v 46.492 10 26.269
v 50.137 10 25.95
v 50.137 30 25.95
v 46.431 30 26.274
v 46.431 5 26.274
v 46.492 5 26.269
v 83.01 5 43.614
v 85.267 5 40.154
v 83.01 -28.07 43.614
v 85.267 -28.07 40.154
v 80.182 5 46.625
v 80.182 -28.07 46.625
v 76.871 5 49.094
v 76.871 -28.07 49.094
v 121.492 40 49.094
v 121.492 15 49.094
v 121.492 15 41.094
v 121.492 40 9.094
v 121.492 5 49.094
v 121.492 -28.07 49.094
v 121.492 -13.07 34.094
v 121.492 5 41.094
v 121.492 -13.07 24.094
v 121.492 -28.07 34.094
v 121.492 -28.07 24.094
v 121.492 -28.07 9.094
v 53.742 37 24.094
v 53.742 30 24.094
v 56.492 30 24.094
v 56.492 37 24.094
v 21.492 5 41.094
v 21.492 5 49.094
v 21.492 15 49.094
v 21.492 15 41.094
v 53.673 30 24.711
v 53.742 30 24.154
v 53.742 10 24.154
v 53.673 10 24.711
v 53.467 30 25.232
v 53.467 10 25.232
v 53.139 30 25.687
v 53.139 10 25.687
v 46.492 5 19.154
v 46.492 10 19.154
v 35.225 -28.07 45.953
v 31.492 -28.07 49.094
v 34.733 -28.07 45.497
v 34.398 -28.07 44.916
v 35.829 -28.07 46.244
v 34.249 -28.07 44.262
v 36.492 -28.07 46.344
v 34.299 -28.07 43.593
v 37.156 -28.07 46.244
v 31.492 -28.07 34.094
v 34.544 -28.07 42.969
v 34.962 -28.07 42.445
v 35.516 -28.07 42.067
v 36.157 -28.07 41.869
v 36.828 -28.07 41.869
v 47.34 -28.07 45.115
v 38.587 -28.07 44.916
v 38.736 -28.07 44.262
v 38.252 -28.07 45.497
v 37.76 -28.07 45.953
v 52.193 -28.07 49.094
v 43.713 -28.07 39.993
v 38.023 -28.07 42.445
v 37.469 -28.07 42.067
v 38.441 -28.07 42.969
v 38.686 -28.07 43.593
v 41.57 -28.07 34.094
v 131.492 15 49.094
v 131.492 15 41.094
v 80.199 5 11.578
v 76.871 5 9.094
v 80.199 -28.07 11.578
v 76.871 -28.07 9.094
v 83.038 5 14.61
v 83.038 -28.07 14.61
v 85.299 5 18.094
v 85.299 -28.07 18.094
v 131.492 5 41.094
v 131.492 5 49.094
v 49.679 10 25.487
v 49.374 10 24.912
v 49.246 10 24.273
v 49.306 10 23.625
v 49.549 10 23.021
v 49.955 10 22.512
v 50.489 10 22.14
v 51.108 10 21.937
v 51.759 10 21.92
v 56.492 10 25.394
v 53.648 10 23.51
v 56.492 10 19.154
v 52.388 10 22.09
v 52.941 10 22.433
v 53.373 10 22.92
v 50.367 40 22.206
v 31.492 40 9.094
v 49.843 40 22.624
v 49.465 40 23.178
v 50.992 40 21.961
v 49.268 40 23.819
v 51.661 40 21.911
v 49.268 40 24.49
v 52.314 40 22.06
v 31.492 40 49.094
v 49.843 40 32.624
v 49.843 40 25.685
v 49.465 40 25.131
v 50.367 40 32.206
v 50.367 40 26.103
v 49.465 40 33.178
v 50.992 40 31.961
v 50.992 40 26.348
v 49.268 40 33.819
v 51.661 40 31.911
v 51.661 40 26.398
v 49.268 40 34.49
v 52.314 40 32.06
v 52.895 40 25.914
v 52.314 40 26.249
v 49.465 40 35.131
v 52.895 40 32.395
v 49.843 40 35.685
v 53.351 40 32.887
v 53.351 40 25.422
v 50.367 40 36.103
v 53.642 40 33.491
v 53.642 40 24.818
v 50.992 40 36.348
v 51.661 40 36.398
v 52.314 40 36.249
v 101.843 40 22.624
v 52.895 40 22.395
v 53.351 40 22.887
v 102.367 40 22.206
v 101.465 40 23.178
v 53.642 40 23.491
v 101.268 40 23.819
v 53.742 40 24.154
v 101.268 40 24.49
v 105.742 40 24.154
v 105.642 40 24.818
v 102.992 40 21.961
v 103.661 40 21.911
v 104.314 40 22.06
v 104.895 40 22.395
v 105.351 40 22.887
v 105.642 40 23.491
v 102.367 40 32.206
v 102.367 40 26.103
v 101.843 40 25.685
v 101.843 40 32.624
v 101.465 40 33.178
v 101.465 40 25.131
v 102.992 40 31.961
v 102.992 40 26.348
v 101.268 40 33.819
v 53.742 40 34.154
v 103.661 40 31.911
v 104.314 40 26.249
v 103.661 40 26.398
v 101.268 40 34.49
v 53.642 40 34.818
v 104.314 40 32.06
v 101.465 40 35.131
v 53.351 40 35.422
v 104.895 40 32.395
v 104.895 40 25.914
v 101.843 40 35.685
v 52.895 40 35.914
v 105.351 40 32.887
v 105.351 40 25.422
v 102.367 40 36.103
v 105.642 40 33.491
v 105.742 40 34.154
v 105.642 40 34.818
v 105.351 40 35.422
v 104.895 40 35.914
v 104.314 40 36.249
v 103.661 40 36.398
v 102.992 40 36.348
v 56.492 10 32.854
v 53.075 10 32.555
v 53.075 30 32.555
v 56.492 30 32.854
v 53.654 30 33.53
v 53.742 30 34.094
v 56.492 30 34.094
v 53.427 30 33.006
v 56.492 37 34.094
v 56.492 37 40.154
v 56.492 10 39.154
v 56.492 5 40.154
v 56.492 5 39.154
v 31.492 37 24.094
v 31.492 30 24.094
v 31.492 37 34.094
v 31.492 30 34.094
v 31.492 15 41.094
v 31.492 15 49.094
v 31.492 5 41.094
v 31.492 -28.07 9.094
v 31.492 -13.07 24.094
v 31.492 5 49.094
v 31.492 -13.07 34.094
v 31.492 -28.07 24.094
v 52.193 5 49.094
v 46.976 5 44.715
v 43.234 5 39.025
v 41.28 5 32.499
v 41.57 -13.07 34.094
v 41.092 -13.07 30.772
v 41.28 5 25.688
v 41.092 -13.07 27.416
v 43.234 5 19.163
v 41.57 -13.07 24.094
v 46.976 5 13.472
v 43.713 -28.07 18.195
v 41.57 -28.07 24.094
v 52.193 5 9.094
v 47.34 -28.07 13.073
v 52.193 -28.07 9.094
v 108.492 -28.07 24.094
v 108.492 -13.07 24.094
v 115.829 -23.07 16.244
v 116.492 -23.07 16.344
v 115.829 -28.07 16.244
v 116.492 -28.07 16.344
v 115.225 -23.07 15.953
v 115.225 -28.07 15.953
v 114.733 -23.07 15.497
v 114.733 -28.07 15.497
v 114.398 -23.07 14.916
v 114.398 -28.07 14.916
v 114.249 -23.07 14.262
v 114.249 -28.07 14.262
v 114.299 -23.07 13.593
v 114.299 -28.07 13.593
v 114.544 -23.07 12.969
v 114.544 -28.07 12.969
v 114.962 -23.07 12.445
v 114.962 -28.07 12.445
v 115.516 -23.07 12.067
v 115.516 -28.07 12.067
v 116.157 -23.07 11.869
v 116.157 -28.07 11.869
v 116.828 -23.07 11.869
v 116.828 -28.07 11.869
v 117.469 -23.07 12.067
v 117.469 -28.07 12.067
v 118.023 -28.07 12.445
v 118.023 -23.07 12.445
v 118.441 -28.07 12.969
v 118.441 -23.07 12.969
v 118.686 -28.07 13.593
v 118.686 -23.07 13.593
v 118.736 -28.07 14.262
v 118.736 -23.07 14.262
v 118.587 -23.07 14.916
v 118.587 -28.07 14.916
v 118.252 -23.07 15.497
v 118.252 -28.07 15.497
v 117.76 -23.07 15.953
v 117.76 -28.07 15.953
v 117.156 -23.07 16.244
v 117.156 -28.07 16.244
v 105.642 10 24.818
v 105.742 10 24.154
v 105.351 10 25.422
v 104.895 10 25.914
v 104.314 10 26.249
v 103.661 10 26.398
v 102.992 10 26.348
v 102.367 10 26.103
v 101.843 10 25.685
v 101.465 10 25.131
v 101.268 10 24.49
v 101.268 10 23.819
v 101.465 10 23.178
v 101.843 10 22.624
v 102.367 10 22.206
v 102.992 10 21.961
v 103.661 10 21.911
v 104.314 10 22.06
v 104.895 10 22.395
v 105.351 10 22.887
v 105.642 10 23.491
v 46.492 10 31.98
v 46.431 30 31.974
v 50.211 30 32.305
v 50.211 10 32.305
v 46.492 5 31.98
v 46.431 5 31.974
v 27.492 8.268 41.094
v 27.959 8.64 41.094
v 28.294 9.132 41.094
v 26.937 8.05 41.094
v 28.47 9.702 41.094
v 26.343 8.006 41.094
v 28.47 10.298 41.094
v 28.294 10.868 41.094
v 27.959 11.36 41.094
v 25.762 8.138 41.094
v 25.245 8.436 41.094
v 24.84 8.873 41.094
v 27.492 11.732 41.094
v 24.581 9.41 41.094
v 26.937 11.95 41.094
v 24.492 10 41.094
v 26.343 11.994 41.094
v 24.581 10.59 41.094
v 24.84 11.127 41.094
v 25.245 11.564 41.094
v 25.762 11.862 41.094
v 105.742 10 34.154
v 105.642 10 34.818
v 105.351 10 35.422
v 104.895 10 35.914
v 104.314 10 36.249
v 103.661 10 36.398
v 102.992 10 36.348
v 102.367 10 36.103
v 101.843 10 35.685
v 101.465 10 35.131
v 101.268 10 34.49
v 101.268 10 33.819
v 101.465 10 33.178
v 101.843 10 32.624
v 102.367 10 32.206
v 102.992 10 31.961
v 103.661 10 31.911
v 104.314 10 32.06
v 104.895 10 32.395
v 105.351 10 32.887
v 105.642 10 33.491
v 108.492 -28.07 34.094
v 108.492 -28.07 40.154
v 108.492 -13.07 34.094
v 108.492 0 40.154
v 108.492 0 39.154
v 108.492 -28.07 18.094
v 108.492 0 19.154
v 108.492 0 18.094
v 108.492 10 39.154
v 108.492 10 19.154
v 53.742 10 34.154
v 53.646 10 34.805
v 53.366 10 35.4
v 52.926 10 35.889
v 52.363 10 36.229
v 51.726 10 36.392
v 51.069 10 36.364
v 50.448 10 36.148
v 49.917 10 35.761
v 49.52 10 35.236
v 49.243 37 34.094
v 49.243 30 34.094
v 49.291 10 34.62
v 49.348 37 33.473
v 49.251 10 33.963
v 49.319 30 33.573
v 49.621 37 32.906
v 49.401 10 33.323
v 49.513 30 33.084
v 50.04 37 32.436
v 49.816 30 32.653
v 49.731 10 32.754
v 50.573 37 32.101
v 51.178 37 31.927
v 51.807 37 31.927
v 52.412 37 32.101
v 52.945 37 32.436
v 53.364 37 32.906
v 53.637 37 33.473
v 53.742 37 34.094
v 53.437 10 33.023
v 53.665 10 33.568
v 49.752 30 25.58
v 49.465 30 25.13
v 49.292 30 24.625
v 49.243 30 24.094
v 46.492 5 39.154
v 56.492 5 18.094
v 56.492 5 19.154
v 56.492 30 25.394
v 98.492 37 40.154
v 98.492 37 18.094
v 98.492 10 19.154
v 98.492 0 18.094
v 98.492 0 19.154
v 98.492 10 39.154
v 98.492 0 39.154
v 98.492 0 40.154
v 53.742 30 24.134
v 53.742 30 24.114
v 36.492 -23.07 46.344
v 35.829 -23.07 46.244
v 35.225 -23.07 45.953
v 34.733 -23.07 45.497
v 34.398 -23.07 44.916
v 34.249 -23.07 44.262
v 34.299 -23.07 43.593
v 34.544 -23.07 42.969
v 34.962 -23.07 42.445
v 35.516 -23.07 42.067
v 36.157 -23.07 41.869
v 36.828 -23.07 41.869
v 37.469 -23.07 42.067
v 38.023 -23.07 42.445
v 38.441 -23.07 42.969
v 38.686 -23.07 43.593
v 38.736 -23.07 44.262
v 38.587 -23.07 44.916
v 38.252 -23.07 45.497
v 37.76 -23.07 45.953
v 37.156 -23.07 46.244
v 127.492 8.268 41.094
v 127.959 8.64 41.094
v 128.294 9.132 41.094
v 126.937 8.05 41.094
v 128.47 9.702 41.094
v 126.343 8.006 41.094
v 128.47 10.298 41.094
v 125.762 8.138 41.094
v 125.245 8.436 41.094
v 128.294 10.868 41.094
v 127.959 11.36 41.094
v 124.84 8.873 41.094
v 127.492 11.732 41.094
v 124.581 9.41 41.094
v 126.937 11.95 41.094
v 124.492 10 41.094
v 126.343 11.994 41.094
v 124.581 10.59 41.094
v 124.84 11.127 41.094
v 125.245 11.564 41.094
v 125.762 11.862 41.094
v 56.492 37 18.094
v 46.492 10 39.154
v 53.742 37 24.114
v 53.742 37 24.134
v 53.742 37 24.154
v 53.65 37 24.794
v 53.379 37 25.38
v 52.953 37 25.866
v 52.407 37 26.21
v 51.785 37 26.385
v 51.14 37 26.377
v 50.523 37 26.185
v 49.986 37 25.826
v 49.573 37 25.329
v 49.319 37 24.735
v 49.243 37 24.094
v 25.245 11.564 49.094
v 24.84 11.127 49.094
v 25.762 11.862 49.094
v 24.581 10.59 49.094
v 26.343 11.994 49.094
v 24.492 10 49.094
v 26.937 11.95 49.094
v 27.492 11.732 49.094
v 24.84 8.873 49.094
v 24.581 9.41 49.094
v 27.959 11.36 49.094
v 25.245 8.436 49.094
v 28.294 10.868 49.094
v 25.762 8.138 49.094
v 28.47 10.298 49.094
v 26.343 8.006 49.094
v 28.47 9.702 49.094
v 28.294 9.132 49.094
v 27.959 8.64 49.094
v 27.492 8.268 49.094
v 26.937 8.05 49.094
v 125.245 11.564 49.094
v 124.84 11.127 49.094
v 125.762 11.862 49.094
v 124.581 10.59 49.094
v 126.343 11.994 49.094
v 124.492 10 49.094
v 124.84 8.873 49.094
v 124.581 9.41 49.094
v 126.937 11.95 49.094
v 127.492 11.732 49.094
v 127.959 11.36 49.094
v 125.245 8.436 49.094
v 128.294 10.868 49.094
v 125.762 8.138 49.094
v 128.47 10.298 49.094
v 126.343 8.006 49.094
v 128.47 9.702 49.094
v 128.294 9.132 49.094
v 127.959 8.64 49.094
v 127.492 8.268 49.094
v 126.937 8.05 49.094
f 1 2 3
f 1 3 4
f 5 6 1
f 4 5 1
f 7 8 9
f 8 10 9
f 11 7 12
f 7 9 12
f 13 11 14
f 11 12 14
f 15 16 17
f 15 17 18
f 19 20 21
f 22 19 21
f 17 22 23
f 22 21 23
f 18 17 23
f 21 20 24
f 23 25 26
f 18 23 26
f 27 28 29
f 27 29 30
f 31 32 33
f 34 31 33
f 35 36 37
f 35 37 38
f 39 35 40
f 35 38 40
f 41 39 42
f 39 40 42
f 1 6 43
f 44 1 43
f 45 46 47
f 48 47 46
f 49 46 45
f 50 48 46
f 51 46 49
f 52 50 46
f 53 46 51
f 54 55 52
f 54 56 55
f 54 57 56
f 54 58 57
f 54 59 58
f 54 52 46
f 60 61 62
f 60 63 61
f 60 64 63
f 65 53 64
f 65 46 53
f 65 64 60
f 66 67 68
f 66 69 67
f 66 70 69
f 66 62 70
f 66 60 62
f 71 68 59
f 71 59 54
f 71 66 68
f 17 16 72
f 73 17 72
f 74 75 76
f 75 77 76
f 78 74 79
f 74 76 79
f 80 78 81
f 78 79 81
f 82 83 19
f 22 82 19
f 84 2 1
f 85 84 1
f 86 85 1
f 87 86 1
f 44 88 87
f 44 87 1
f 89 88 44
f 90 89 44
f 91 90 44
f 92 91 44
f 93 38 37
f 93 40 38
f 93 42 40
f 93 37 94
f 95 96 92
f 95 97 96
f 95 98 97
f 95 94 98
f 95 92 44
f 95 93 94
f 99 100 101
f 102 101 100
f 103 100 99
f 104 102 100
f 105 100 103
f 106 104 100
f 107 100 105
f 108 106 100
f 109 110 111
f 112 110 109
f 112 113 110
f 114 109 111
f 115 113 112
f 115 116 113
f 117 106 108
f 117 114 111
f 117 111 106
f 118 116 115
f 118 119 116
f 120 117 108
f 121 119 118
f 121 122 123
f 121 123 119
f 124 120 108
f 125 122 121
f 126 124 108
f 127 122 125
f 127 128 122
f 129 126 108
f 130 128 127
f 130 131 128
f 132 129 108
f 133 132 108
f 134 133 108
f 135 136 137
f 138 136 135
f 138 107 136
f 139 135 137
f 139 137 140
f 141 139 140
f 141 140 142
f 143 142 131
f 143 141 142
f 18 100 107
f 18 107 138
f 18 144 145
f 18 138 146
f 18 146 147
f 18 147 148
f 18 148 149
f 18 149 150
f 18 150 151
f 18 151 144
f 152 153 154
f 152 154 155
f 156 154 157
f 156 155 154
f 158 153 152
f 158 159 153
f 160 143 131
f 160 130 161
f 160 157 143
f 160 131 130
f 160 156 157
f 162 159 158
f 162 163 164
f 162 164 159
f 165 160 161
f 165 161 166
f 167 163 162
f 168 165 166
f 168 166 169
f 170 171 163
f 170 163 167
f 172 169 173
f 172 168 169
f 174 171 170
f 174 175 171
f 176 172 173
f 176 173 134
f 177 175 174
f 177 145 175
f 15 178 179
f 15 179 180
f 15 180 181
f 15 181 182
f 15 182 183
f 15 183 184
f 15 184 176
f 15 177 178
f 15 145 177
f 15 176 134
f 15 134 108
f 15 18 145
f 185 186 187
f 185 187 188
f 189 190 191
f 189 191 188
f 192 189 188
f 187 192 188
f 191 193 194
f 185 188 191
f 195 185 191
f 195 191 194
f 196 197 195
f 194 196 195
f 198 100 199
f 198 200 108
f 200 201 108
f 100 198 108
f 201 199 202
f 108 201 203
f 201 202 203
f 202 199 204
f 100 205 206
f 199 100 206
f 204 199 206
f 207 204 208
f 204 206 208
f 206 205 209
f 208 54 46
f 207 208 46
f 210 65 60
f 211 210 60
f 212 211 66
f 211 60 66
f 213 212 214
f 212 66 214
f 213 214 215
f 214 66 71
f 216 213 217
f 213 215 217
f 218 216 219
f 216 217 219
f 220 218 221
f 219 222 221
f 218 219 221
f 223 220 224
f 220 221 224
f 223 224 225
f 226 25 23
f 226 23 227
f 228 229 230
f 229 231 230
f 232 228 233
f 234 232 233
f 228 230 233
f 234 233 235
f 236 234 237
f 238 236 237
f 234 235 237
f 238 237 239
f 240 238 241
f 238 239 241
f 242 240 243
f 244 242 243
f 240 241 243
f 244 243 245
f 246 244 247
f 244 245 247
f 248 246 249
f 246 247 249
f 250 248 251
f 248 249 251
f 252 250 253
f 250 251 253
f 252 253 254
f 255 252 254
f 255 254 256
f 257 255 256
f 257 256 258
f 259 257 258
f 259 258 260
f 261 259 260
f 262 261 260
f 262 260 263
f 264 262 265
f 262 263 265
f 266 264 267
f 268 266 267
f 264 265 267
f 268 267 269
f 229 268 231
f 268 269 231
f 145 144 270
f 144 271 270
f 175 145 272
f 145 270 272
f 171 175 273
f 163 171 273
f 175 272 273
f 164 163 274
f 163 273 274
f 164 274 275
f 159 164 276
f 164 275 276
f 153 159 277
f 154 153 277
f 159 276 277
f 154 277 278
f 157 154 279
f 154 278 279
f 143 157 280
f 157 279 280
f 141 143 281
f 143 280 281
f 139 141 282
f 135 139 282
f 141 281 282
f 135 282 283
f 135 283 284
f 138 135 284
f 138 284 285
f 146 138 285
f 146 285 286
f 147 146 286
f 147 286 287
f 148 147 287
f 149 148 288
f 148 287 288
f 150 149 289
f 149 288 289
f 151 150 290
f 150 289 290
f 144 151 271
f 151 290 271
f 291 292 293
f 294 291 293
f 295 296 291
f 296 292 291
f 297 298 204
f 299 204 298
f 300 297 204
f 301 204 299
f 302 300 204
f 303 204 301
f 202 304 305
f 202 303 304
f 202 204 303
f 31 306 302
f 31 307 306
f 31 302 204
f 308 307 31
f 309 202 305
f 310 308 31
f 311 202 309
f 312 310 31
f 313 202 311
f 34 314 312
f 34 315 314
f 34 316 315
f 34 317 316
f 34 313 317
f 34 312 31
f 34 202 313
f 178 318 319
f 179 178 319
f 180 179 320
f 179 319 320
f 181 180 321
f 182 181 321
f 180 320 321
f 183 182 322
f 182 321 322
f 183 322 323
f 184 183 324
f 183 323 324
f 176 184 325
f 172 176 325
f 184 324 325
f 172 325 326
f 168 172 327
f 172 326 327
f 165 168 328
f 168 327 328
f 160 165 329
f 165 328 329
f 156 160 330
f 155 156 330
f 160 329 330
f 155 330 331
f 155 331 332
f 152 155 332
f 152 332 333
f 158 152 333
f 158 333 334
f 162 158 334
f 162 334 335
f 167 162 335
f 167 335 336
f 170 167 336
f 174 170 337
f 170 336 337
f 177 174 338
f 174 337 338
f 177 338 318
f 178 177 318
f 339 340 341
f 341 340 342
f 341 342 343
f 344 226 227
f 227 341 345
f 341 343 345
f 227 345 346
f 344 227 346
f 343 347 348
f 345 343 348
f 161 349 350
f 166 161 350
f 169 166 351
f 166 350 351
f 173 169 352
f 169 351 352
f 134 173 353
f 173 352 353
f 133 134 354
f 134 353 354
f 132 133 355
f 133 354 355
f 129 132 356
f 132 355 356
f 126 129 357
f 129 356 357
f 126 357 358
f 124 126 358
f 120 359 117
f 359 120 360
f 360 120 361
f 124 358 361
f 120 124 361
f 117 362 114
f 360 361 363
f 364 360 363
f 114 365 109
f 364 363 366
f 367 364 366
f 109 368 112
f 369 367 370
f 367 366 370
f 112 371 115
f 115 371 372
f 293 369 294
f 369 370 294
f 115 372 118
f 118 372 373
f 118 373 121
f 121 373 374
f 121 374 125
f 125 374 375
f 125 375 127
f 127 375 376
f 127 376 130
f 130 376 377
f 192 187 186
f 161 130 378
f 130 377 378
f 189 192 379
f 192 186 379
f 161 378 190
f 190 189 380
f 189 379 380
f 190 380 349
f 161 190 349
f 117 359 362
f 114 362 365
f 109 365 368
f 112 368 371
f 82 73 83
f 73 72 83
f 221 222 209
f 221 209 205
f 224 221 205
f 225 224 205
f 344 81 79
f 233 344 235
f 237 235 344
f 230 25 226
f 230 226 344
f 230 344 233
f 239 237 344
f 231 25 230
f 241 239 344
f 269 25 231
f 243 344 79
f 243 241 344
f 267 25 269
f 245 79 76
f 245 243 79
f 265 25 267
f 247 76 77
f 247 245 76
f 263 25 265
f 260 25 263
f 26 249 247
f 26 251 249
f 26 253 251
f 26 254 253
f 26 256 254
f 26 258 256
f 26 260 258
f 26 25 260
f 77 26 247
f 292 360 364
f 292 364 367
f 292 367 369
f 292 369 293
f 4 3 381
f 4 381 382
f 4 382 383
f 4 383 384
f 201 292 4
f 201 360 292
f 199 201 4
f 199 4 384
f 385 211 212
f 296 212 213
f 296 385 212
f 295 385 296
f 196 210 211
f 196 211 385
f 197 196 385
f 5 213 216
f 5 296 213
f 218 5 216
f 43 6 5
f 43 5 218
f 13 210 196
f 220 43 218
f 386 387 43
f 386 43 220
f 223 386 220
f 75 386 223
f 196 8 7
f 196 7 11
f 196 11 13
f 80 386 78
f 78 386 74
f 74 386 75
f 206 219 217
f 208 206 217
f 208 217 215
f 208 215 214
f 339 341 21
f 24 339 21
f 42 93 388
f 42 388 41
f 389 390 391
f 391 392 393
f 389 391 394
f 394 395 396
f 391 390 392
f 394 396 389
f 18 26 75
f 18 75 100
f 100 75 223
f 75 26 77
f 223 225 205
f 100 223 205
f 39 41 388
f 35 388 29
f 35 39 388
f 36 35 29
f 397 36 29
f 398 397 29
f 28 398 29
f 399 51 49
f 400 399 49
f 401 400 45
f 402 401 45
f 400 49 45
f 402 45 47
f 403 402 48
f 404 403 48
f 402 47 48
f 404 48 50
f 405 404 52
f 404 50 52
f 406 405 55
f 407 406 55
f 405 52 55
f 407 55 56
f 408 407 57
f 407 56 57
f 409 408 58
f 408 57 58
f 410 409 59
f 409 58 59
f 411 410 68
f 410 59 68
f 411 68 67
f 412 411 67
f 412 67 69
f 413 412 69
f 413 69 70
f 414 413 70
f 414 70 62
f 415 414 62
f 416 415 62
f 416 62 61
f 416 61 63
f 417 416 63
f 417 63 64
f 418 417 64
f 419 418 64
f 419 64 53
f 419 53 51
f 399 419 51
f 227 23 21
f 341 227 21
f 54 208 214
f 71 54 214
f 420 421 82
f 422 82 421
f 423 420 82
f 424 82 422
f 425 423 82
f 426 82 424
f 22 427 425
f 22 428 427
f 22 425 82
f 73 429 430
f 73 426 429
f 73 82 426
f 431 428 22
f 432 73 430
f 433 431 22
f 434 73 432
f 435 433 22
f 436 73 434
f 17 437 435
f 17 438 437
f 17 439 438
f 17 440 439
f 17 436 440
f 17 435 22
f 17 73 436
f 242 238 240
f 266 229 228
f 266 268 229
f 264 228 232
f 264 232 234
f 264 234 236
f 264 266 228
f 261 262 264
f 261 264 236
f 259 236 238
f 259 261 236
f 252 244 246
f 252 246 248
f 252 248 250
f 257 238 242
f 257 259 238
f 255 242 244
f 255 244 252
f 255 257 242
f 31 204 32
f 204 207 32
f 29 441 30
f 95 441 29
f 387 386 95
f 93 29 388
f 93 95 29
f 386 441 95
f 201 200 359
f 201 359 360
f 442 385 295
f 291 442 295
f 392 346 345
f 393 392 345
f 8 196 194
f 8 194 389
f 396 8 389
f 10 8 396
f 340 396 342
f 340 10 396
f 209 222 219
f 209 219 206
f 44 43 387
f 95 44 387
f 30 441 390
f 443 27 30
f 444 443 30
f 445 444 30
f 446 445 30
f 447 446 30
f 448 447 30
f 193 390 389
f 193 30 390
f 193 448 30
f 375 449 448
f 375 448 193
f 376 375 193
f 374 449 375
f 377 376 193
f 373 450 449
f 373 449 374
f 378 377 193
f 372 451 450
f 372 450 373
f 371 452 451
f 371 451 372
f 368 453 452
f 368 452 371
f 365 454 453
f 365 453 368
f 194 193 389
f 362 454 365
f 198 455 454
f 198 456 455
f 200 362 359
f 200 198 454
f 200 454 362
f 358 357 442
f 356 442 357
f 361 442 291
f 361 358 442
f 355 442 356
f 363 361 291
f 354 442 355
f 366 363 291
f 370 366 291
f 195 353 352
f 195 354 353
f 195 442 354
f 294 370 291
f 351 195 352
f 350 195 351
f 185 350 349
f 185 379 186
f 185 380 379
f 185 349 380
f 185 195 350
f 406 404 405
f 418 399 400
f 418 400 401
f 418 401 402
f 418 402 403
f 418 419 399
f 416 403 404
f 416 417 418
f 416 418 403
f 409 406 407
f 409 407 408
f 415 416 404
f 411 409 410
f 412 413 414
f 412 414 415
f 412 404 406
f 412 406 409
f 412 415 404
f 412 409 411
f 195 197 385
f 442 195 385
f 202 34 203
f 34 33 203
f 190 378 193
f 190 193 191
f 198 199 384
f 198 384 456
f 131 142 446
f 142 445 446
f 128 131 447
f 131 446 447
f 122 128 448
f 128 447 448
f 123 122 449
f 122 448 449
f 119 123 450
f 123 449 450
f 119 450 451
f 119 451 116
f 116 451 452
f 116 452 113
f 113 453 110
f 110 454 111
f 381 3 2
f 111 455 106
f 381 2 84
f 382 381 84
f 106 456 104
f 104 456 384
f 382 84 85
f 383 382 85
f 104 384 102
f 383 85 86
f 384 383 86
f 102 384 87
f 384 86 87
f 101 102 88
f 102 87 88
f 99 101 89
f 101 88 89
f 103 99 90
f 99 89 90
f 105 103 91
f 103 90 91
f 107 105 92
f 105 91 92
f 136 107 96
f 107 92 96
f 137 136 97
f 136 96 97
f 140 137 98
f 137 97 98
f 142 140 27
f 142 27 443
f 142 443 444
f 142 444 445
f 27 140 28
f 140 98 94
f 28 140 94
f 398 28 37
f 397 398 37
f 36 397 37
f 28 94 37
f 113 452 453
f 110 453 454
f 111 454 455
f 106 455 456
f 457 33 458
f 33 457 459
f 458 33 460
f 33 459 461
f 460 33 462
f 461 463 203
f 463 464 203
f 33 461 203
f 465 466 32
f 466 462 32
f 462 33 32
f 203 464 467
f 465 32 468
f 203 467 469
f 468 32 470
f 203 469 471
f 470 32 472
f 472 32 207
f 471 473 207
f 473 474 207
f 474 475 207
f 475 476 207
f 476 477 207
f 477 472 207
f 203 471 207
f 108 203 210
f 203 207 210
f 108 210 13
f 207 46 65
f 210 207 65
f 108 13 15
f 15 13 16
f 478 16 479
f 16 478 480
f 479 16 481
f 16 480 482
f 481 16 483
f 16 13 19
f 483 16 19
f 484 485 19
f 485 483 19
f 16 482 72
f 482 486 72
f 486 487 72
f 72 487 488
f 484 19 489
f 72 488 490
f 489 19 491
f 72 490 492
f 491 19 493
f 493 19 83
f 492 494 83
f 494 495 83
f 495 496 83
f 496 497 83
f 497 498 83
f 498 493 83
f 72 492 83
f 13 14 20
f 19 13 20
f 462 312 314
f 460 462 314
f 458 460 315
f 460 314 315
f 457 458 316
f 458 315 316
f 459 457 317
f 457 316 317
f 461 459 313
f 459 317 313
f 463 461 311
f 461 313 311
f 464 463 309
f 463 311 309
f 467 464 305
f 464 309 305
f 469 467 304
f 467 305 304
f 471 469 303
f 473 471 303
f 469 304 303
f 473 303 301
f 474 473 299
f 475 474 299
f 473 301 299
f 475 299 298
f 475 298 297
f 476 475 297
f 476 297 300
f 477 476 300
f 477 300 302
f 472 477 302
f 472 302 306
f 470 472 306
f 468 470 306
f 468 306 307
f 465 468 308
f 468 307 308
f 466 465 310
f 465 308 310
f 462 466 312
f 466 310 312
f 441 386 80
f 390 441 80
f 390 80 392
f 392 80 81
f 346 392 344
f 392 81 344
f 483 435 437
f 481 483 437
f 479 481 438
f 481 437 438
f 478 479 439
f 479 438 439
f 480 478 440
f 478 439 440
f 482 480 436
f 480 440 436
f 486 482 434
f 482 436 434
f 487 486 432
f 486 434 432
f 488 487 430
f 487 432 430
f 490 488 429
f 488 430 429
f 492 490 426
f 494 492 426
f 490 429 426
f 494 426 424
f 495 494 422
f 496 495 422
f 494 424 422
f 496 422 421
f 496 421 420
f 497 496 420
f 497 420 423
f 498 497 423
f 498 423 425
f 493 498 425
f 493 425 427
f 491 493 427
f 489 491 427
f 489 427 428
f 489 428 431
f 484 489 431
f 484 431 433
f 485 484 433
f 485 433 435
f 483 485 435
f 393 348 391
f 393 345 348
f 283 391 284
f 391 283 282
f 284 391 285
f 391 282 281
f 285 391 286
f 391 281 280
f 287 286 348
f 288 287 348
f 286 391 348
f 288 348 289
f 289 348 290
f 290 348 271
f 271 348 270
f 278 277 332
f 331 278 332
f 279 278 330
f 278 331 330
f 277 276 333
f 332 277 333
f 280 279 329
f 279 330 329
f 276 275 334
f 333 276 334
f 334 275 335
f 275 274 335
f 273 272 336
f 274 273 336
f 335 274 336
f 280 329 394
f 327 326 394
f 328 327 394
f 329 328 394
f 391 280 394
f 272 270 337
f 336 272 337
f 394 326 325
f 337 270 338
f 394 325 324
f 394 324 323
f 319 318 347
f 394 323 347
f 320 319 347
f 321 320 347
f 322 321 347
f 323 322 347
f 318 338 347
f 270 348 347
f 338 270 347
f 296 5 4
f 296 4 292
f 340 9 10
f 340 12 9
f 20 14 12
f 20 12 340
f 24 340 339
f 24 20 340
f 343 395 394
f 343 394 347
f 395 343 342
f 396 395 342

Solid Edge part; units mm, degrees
sketch "Sketch1" plane through (0, 0, 0) normal (0, -1, 0) x (1, 0, 0)
  line L0 (31.4924, 49.0939) -> (121.4924, 49.0939)
  line L1 (121.4924, 49.0939) -> (121.4924, 9.0939)
  line L2 (121.4924, 9.0939) -> (31.4924, 9.0939)
  line L3 (31.4924, 9.0939) -> (31.4924, 49.0939)
  dimension "D1" = 90
  dimension "D2" = 40
extrude "Protrusion1" add sketch "Sketch1" against normal blind 40
sketch "Sketch2" plane through (64.4924, 0, 22.0939) normal (0, -1, 0) x (1, 0, 0)
  line L0 (-18.0616, 9.8803) -> (-8, 10.7605)
  line L1 (-8, 10.7605) -> (-8, 18.0605)
  line L2 (-8, 18.0605) -> (34, 18.0605)
  line L3 (34, -4) -> (34, 18.0605)
  line L4 (-8, -4) -> (34, -4)
  line L5 (-8, -4) -> (-8, 3.3)
  line L6 (-8, 3.3) -> (-18.0616, 4.1803)
  line L7 (-18.0616, 4.1803) -> (-18.0616, 9.8803)
extrude "ExtrudedCutout_4" cut sketch "Sketch2" against normal blind 37
sketch "Sketch3" plane through (31.4924, 20, 22.0939) normal (-1, 0, 0) x (0, -1, 0)
  line L0 (-17, 2) -> (-17, 12)
  line L1 (-17, 12) -> (-10, 12)
  line L2 (-10, 12) -> (-10, 2)
  line L3 (-10, 2) -> (-17, 2)
  dimension "D1" = 10
  dimension "D2" = 7
  dimension "D3" = 10
  dimension "D4" = 3
  dimension "D5" = 15
extrude "Cutout1" cut sketch "Sketch3" against normal up to next
sketch "Sketch4" plane through (64.4924, 0, 22.0939) normal (0, -1, 0) x (1, 0, 0)
  line L0 (-8, 17.0605) -> (-18, 17.0605)
  line L1 (-18, 17.0605) -> (-18, -2.9395)
  line L2 (-18, -2.9395) -> (-8, -2.9395)
  line L3 (-8, -2.9395) -> (-8, 17.0605)
  line L4 (34, 17.0605) -> (44, 17.0605)
  line L5 (44, 17.0605) -> (44, -2.9395)
  line L6 (44, -2.9395) -> (34, -2.9395)
  line L7 (34, -2.9395) -> (34, 17.0605)
  dimension "D1" = 1
  dimension "D2" = 20
  dimension "D3" = 1
  dimension "D4" = 10
  dimension "D5" = 20
  dimension "D6" = 10
extrude "ExtrudedCutout_6" cut sketch "Sketch4" against normal blind 10
sketch "Sketch5" plane through (91.2324, 10, 21.645) normal (0, -1, 0) x (1, 0, 0)
  circle A0 centre (12.26, 12.5095) radius 1.65
  circle A1 centre (-39.74, 12.5095) radius 1.65
  circle A2 centre (-39.74, 2.5095) radius 1.65
  circle A3 centre (12.26, 2.5095) radius 1.65
  dimension "D1" = 5
  dimension "D2" = 3.3
  dimension "D3" = 5
  dimension "D4" = 10
  dimension "D5" = 5
  dimension "D6" = 10
  dimension "D7" = 5
extrude "Cutout2" cut sketch "Sketch5" against normal through all
sketch "Sketch6" plane through (64.4924, 0, 22.0939) normal (0, -1, 0) x (1, 0, 0)
  circle A0 centre (39, 2.0605) radius 2.25
  circle A1 centre (-13, 12.0605) radius 2.25
  circle A2 centre (-13, 2.0605) radius 2.25
  circle A3 centre (39, 12.0605) radius 2.25
extrude "Cutout3" cut sketch "Sketch6" against normal up to next
sketch "Sketch7" plane through (68.9924, 0, 22.0939) normal (0, -1, 0) x (1, 0, 0)
  line L0 (-37.5, 27) -> (-37.5, -13)
  line L1 (-37.5, -13) -> (52.5, -13)
  line L2 (52.5, -13) -> (52.5, 27)
  line L3 (52.5, 27) -> (-37.5, 27)
  line L4 (-22.5616, 13.0605) -> (-22.5616, 18.0605)
  line L5 (-22.5616, 18.0605) -> (39.5, 18.0605)
  line L6 (39.5, 18.0605) -> (39.5, -4)
  line L7 (39.5, -4) -> (-22.5616, -4)
  line L8 (-22.5616, 13.0605) -> (-22.5616, -4)
extrude "ExtrudedProtrusion_4" add sketch "Sketch7" along normal blind 28.07
sketch "Sketch8" plane through (68.9924, -28.07, 22.0939) normal (0, -1, 0) x (1, 0, 0)
  circle A0 centre (-4.46, 7) radius 23.5
  dimension "D1" = 33.04
  dimension "D2" = 47
extrude "ExtrudedCutout_9" cut sketch "Sketch8" against normal blind 33.07
sketch "Sketch9" plane through (41.8429, -28.07, 29.0939) normal (0, -1, 0) x (0, 0, 1)
  line L0 (0, 10.3505) -> (5, 10.3505)
  line L1 (5, 10.3505) -> (5, -79.6495)
  line L2 (5, -79.6495) -> (0, -79.6495)
  line L3 (0, -79.6495) -> (-5, -79.6495)
  line L4 (-5, -79.6495) -> (-5, 10.3505)
  line L5 (-5, 10.3505) -> (0, 10.3505)
  dimension "D1" = 5
  dimension "D2" = 5
extrude "Cutout4" cut sketch "Sketch9" against normal blind 15
sketch "Sketch10" plane through (41.8429, -28.07, 41.5939) normal (0, -1, 0) x (0, 0, 1)
  circle A0 centre (2.5, 5.3505) radius 2.25
  circle A1 centre (-27.5, -74.6495) radius 2.25
  dimension "D1" = 5
  dimension "D2" = 5
  dimension "D3" = 4.5
  dimension "D4" = 5
  dimension "D5" = 5
extrude "ExtrudedCutout_13" cut sketch "Sketch10" against normal blind 5
sketch "Sketch11" plane through (76.4924, 5.965, 49.0939) normal (0, 0, 1) x (-1, 0, 0)
  line L0 (-0.379, 0.965) -> (24.299, 0.965)
  line L1 (24.299, 0.965) -> (45, 0.965)
  line L2 (45, 0.965) -> (55, 0.965)
  line L3 (55, 0.965) -> (55, -9.035)
  line L4 (55, -9.035) -> (45, -9.035)
  line L5 (45, -9.035) -> (-45, -9.035)
  line L6 (-45, -9.035) -> (-55, -9.035)
  line L7 (-55, -9.035) -> (-55, 0.965)
  line L8 (-55, 0.965) -> (-45, 0.965)
  line L9 (-45, 0.965) -> (-0.379, 0.965)
  dimension "D1" = 10
  dimension "D2" = 10
  dimension "D3" = 10
  dimension "D4" = 10
extrude "ExtrudedProtrusion_9" add sketch "Sketch11" against normal blind 8
sketch "Sketch12" plane through (26.4924, 10, 41.0939) normal (0, 0, -1) x (-1, 0, 0)
  circle A0 centre (0, 0) radius 2
  circle A1 centre (-100, 0) radius 2
  dimension "D1" = 4
  dimension "D2" = 5
  dimension "D3" = 5
  dimension "D4" = 4
  dimension "D5" = 5
  dimension "D6" = 5
extrude "Cutout5" cut sketch "Sketch12" against normal through all
